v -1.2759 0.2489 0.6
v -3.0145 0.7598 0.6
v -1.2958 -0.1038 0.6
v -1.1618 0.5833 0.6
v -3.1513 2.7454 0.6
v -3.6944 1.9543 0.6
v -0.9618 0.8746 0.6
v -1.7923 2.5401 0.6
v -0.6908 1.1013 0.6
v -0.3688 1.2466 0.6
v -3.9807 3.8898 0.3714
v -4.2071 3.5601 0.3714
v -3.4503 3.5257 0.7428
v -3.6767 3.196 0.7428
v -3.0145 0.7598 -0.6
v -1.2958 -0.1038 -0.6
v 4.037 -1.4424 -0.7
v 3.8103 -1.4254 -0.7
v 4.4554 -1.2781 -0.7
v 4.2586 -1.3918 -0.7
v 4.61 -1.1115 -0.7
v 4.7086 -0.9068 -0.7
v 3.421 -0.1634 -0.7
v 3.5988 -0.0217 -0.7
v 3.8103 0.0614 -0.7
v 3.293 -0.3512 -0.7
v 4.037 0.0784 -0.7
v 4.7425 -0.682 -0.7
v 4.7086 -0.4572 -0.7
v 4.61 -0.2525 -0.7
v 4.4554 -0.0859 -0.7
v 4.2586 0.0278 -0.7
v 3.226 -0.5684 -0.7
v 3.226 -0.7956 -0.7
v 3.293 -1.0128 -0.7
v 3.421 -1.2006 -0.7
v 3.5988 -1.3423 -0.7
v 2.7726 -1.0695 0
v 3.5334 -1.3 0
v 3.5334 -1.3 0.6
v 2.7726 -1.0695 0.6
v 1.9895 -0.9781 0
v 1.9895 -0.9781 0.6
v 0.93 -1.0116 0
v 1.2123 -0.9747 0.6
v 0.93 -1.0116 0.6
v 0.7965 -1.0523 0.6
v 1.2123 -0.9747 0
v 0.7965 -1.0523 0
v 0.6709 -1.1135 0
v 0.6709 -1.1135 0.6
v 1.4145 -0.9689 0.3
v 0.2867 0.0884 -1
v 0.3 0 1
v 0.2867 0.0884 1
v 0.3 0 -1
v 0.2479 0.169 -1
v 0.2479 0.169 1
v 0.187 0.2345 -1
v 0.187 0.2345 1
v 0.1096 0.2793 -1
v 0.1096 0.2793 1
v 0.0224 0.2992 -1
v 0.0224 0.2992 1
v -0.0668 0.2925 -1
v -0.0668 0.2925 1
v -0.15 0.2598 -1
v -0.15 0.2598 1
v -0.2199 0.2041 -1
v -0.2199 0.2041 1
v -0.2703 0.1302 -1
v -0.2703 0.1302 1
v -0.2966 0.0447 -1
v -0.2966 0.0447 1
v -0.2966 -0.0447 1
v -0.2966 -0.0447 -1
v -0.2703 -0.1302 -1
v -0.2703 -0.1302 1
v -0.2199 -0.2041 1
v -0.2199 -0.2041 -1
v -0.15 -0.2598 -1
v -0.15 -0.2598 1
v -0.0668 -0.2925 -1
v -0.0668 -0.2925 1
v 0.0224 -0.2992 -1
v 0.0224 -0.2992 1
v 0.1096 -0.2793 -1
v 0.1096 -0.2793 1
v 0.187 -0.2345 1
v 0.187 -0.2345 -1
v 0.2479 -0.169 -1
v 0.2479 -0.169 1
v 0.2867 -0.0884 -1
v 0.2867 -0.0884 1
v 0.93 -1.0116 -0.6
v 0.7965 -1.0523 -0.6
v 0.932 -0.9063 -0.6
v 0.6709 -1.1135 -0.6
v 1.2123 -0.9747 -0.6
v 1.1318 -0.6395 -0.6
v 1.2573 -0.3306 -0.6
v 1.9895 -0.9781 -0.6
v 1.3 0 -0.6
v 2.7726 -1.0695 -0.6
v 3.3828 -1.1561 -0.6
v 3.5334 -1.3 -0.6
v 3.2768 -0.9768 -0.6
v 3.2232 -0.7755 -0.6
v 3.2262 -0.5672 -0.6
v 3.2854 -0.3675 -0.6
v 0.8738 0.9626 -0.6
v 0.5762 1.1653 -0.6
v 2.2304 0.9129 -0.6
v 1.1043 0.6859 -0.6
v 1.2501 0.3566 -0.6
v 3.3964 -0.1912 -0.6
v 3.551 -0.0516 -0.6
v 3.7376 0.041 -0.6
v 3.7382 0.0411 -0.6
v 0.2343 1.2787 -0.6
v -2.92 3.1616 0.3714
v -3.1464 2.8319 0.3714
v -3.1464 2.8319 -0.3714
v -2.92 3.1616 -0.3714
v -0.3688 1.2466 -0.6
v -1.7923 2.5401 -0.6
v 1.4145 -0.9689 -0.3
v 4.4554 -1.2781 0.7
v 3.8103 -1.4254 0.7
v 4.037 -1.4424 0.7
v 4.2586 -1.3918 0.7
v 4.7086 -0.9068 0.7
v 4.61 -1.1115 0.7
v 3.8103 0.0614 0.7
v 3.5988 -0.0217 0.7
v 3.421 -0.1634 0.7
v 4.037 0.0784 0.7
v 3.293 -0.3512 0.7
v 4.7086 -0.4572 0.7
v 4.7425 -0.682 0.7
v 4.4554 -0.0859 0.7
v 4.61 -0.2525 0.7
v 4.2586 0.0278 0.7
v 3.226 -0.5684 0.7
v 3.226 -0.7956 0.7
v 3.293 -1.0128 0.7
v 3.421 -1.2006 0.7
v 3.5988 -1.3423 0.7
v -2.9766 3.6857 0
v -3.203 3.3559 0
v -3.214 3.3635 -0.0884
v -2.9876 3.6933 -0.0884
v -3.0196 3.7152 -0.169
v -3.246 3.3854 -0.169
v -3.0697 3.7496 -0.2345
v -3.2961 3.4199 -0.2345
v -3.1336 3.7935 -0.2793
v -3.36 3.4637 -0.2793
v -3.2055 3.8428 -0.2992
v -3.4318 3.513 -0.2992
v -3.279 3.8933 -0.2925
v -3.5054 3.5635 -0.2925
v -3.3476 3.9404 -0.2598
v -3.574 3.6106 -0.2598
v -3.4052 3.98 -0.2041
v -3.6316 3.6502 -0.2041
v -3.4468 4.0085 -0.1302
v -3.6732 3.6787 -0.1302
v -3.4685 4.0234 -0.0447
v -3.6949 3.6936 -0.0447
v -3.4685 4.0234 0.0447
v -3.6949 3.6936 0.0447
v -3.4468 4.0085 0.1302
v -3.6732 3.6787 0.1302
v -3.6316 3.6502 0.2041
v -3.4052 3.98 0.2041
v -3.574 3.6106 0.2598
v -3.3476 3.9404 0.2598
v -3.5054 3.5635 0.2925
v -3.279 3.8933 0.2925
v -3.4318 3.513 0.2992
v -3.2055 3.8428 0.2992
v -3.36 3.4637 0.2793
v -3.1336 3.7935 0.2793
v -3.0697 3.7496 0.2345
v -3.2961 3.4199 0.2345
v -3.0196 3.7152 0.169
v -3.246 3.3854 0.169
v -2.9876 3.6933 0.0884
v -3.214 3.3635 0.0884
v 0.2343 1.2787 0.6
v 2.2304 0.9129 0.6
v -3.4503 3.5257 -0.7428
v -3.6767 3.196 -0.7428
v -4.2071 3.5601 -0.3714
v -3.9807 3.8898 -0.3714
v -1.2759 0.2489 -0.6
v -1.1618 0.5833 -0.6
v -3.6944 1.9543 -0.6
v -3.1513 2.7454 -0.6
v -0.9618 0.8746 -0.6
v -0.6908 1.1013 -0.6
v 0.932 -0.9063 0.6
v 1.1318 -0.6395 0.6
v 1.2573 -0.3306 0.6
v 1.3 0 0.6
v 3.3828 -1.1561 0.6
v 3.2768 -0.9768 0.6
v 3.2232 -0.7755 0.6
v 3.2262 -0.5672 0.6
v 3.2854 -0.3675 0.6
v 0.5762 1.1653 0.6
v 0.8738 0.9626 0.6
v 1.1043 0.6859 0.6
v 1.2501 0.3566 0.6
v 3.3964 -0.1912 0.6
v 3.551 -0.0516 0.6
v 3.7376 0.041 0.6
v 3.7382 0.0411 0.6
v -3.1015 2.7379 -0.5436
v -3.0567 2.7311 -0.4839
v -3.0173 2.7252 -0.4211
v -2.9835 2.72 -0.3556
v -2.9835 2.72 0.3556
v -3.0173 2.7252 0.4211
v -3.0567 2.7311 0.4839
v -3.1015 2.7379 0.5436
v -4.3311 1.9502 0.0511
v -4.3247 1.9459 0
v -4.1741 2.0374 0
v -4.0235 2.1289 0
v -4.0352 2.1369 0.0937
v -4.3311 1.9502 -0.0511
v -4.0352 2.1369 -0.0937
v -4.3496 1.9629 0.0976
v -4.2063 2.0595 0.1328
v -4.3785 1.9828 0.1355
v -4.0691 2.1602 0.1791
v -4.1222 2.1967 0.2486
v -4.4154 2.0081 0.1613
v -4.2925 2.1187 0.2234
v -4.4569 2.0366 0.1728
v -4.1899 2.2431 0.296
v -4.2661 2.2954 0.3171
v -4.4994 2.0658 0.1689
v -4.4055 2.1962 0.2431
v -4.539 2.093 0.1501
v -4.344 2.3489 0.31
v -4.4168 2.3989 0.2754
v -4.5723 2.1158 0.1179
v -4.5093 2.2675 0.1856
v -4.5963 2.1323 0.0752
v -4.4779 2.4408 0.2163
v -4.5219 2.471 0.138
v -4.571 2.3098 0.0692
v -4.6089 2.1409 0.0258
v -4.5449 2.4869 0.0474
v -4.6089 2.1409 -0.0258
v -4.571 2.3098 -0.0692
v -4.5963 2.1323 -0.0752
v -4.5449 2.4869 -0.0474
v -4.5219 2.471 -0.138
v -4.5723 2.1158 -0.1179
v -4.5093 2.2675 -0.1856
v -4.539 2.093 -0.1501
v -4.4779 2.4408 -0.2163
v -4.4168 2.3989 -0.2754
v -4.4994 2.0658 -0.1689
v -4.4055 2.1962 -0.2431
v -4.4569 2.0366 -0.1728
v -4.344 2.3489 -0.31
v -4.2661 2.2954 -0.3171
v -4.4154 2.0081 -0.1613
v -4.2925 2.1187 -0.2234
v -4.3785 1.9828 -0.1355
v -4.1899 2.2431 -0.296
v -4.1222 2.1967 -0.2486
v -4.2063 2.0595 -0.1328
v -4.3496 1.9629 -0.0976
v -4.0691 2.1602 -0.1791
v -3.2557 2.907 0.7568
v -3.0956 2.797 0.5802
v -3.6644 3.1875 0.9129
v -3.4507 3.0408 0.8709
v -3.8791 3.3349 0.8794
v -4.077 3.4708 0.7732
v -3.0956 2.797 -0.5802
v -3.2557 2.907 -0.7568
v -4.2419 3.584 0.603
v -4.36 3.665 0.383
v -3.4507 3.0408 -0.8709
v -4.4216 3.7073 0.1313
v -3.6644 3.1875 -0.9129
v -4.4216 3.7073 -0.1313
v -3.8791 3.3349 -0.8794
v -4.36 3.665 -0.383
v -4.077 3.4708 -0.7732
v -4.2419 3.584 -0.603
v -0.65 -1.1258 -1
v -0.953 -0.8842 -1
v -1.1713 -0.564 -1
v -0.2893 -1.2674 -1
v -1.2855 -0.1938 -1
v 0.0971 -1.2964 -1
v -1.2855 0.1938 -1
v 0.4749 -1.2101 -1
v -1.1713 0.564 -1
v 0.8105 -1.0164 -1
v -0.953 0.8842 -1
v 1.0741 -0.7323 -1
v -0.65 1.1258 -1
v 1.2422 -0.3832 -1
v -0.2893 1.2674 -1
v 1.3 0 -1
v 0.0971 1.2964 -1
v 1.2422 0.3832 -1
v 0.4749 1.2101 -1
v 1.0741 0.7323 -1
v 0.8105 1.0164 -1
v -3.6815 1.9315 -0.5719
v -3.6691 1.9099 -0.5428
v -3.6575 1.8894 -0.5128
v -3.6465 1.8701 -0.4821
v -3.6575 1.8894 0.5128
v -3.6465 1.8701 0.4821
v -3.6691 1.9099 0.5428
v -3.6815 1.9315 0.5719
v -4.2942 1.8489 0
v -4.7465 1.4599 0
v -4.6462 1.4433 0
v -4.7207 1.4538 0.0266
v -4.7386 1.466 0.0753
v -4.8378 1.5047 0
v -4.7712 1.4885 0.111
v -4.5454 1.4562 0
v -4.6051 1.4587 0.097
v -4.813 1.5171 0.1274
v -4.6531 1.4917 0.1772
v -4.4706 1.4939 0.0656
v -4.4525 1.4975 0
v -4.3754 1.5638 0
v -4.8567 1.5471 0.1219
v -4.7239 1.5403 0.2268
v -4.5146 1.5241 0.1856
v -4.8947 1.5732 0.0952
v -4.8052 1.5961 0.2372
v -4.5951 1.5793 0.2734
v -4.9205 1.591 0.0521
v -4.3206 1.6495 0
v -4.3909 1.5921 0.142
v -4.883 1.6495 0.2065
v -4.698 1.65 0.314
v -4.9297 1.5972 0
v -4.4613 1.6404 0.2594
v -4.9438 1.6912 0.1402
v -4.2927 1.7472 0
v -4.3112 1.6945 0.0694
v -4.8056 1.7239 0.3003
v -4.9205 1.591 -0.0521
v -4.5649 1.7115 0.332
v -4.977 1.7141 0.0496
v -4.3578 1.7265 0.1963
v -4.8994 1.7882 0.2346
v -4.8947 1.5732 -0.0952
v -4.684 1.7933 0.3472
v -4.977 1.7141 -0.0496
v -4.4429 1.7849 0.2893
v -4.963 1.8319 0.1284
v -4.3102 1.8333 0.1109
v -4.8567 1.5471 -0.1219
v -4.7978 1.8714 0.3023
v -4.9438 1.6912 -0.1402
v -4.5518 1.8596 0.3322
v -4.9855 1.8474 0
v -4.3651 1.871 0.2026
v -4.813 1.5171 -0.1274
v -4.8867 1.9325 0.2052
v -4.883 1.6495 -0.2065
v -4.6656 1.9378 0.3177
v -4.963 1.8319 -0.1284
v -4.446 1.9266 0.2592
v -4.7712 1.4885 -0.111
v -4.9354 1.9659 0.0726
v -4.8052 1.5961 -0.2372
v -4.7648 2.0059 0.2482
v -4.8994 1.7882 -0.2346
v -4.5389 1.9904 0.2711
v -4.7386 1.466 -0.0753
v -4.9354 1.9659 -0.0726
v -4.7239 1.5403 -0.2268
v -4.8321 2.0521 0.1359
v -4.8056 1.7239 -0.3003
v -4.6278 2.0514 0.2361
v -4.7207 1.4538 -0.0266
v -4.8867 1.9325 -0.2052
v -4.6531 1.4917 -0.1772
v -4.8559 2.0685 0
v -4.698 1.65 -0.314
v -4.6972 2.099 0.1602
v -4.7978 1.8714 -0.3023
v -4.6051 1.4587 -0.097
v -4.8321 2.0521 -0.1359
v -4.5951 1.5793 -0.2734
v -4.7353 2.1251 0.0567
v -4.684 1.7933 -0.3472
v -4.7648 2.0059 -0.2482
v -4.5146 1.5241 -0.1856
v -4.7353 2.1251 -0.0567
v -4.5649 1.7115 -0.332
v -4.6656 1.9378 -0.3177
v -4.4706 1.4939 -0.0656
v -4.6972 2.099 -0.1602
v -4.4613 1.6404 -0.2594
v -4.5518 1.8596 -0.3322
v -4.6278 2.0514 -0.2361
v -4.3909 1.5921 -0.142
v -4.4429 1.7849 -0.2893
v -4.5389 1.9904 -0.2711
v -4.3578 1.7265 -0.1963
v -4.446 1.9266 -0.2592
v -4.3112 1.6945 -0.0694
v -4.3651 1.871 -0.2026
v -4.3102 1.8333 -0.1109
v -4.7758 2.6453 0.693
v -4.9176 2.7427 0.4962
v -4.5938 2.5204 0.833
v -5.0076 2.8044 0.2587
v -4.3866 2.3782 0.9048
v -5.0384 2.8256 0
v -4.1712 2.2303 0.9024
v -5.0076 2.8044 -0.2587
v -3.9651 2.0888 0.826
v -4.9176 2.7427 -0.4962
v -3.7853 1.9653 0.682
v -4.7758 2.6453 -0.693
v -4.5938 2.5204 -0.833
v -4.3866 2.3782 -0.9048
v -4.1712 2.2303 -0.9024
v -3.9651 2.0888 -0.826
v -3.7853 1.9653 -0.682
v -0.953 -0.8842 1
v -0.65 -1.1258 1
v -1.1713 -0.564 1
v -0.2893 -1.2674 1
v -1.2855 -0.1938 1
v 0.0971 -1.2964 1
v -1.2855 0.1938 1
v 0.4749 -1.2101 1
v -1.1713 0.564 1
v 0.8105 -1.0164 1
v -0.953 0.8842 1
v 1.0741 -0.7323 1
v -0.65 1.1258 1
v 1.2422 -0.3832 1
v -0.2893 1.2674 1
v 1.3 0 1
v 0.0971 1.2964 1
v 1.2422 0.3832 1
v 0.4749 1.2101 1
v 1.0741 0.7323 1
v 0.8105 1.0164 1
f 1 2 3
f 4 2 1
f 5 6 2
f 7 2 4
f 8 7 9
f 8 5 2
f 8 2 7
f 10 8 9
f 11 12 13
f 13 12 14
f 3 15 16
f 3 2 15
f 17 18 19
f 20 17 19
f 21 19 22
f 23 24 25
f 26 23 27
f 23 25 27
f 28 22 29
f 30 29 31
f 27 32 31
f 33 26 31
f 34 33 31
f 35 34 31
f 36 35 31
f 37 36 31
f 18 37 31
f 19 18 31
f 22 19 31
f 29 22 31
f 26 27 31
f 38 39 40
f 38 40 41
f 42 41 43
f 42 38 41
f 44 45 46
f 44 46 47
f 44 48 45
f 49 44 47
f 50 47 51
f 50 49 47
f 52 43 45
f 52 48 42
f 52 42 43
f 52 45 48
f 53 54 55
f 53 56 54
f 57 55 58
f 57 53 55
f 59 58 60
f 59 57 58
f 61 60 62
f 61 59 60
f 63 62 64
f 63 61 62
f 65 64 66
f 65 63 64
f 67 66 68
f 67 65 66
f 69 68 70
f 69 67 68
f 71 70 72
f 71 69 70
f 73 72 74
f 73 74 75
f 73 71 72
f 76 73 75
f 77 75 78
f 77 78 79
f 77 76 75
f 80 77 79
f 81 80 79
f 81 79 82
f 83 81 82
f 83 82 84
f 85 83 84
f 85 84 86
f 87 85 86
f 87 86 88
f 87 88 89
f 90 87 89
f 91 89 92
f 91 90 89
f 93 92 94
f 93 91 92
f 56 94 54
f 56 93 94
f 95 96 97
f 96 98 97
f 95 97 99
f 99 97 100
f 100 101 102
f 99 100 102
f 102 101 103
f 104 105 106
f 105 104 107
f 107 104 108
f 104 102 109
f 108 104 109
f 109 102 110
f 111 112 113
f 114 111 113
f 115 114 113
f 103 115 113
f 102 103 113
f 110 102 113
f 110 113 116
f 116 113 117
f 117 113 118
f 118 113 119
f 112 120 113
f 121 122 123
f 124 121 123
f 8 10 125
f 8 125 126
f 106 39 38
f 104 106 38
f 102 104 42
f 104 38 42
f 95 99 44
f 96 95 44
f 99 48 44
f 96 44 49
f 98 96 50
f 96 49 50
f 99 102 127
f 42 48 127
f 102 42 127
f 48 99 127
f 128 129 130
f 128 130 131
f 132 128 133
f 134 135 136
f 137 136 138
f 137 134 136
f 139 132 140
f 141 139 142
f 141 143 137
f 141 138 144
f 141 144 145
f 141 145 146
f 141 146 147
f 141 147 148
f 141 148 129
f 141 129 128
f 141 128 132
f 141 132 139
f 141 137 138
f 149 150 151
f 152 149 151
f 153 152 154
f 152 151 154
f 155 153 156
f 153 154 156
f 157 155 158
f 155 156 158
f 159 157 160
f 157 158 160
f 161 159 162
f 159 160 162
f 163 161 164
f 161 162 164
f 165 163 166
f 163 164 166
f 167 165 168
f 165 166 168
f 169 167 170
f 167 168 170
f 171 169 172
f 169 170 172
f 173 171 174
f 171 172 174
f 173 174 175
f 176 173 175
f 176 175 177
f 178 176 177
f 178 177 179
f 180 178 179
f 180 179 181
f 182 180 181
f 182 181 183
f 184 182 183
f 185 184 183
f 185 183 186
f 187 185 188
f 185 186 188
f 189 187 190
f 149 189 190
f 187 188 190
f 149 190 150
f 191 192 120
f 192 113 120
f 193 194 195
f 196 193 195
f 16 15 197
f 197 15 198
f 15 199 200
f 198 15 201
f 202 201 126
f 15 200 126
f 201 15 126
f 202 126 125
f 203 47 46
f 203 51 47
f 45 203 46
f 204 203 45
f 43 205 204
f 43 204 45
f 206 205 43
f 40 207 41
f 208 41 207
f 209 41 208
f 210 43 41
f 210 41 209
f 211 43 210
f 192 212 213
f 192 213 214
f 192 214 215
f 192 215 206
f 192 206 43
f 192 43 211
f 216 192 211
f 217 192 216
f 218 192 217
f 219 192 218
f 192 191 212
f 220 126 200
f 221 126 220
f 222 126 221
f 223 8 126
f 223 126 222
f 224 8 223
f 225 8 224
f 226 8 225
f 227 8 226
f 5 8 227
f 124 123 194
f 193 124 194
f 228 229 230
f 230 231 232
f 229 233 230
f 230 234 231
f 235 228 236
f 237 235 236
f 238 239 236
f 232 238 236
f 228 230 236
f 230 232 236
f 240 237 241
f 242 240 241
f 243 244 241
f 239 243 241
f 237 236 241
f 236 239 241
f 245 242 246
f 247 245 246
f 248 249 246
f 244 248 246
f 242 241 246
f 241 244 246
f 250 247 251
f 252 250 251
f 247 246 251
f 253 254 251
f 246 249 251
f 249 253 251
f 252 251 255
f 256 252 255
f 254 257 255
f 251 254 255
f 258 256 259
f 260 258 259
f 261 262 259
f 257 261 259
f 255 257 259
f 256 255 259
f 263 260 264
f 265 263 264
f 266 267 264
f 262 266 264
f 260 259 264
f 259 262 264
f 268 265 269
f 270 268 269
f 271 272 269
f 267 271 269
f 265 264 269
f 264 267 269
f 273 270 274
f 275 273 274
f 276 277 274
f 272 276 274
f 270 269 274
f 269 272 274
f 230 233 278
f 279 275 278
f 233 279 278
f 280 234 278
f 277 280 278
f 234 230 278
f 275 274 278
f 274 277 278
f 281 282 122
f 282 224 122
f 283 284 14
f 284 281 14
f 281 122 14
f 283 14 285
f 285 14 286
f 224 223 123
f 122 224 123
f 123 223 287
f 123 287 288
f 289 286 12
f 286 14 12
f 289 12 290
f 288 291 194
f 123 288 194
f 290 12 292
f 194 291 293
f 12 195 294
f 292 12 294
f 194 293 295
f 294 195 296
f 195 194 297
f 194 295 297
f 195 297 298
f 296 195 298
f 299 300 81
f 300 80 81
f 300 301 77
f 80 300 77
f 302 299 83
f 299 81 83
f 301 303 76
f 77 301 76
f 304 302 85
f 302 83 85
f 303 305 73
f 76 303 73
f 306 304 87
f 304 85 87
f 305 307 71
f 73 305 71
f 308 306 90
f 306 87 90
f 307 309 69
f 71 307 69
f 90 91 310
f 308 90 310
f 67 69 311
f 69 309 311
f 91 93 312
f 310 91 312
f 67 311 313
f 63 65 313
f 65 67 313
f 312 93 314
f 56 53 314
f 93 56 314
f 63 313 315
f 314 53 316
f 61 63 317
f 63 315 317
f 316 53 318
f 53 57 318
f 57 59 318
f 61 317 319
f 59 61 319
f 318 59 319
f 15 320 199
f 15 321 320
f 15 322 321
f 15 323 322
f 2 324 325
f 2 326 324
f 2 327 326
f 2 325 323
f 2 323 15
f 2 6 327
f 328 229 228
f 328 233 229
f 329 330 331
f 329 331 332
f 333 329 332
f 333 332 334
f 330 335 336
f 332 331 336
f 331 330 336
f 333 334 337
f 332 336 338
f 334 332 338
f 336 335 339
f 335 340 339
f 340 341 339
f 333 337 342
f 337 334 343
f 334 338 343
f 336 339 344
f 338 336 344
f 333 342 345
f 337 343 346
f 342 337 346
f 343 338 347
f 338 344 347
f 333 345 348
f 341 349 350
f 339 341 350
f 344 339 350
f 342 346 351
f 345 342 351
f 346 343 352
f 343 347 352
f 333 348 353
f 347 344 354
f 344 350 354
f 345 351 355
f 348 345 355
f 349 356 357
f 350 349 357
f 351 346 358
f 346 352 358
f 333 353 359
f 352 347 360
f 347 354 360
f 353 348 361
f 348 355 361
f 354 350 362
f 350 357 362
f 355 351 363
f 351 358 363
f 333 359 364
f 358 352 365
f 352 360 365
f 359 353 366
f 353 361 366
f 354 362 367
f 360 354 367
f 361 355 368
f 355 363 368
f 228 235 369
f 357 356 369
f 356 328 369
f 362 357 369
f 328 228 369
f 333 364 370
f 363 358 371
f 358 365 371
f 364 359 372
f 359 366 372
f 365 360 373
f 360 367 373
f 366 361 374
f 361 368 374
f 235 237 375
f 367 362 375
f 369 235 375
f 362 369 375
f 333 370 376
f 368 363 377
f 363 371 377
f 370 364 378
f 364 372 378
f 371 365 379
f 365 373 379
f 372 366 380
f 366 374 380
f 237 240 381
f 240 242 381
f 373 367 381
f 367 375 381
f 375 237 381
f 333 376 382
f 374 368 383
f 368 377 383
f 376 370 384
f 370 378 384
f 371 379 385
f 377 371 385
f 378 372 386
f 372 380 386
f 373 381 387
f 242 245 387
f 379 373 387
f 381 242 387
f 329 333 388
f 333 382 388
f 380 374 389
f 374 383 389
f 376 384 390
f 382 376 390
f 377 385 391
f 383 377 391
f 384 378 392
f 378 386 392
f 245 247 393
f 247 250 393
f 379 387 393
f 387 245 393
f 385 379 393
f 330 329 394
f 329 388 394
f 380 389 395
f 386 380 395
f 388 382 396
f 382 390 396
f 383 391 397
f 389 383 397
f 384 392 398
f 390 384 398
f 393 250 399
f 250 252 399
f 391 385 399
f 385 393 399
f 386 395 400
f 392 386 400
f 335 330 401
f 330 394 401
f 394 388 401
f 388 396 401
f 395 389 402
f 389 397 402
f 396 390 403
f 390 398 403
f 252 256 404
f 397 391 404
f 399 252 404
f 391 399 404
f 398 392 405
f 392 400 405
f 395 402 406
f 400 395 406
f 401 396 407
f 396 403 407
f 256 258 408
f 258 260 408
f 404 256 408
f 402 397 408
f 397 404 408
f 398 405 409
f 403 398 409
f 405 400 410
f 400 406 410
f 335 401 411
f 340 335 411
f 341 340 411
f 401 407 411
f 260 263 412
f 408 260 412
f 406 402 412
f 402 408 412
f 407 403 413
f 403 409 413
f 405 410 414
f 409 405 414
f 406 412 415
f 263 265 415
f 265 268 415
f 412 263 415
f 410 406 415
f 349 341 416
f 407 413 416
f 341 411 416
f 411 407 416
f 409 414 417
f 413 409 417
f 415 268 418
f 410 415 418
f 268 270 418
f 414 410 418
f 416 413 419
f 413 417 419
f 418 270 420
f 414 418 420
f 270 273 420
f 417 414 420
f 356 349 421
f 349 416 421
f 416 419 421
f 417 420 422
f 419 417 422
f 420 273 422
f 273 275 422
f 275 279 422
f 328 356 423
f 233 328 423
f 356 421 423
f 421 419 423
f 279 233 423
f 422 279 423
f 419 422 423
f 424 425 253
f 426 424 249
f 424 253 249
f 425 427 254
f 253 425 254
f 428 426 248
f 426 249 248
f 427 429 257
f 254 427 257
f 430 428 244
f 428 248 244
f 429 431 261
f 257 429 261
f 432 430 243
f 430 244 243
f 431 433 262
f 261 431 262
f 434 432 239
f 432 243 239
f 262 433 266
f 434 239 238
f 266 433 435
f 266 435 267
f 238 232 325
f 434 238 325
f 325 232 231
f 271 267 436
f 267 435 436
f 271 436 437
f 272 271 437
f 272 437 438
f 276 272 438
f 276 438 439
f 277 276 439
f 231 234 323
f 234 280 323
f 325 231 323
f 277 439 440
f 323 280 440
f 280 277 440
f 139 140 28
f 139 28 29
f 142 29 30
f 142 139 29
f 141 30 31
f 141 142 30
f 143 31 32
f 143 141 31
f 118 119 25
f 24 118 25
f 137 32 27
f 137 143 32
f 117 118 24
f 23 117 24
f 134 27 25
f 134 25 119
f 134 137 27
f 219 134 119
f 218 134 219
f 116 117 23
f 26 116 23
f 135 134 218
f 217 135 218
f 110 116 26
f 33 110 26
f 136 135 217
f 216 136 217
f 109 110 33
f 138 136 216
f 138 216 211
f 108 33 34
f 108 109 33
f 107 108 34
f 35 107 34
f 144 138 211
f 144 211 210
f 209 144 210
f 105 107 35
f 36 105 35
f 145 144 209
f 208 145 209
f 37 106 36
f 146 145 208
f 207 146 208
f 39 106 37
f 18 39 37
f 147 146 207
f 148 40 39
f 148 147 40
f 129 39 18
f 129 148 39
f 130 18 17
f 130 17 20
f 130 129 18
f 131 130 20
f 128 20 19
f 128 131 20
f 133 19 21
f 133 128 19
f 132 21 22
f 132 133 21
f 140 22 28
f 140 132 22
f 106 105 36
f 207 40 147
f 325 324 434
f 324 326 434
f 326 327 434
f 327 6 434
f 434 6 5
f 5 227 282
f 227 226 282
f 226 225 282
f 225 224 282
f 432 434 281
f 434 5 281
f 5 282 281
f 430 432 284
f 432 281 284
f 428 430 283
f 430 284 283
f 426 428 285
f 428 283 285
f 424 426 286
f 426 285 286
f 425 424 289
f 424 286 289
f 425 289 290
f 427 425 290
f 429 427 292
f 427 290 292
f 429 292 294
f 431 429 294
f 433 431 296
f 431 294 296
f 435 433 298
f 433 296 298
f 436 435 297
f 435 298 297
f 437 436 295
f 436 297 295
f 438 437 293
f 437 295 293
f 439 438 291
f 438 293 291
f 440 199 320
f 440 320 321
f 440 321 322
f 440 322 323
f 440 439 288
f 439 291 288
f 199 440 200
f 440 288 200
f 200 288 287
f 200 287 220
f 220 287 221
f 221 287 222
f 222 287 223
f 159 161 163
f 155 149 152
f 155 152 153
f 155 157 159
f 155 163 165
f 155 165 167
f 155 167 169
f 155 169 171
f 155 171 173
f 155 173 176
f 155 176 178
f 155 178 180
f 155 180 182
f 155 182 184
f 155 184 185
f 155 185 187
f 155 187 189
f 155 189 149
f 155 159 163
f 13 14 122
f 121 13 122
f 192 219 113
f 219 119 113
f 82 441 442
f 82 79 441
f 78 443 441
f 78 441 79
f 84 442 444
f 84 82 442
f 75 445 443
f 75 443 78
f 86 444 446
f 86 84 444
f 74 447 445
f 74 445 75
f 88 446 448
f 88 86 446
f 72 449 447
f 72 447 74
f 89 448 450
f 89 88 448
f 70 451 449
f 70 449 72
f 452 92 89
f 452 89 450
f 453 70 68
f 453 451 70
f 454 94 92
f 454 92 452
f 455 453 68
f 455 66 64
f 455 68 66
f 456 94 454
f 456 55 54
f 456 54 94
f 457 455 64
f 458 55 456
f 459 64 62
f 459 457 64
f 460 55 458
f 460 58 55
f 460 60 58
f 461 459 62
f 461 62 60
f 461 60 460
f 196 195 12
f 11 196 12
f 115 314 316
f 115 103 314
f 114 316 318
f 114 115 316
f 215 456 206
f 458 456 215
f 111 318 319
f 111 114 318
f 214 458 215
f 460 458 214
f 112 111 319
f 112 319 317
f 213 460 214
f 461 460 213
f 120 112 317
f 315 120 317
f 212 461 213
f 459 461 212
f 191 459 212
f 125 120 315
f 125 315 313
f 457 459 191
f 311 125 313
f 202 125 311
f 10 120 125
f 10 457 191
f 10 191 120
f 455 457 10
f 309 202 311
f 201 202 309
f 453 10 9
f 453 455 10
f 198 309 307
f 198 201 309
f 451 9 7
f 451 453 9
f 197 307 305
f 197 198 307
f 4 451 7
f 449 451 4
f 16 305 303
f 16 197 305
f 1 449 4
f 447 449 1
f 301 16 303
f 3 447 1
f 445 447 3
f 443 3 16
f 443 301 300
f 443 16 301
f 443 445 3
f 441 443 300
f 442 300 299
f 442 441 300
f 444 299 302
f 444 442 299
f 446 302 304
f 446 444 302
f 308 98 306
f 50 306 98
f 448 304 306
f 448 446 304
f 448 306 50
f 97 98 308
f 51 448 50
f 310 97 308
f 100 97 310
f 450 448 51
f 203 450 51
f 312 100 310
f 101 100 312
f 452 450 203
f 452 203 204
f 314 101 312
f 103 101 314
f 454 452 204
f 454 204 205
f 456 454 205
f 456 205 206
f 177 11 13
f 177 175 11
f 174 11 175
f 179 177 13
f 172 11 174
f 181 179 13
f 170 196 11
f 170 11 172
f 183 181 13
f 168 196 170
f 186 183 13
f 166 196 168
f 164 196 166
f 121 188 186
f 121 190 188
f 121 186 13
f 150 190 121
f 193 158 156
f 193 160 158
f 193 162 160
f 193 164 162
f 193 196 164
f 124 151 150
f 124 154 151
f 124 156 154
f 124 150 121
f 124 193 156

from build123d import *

# Parameters (mm, degrees)
SKETCH1_R           = 0.3
BOSS_EXTRUDE1_DEPTH = 1
SKETCH1_3_R         = 0.7625000000000004
BOSS_EXTRUDE2_DEPTH = 0.7
BOSS_EXTRUDE3_DEPTH = 0.6
BOSS_EXTRUDE4_DEPTH = 0.6
BOSS_EXTRUDE6_DEPTH = 0.4
SKETCH6_R           = 0.3000000000000001
BOSS_EXTRUDE7_DEPTH = 0.4


with BuildPart() as part:
    # Sketch1 → Boss-Extrude1 (new, symmetric)
    with BuildSketch(Plane.XY):
        with BuildLine():
            ThreePointArc((-1.295848634155192, -0.1038090427569955), (-0.5937418022379002, -1.1564906710714489), (0.6708713102684308, -1.113522197829356))
            ThreePointArc((0.6708713102684308, -1.113522197829356), (1.1318420171006551, -0.639479200854508), (1.3, -3.2e-16))
            ThreePointArc((1.3, 0), (0.9986616226828521, 0.8322709675222685), (0.23434621018391855, 1.2787031922117167))
            ThreePointArc((0.23434621018391855, 1.2787031922117167), (-0.0691085103528238, 1.2981617825975365), (-0.3687821609940866, 1.2465952501644355))
            ThreePointArc((-0.3687821609940866, 1.2465952501644355), (-1.0717494388265327, 0.7357670421913532), (-1.295848634155192, -0.1038090427569955))
        make_face()
        Circle(SKETCH1_R, mode=Mode.SUBTRACT)
    extrude(amount=BOSS_EXTRUDE1_DEPTH, both=True)



with BuildPart() as body_2:
    # Sketch1<3> → Boss-Extrude2 (new, symmetric)
    with BuildSketch(Plane.XY):
        with Locations((3.98, -0.682)):
            Circle(SKETCH1_3_R)
    extrude(amount=BOSS_EXTRUDE2_DEPTH, both=True)


with BuildPart() as part_1:
    add(part.part)

    add(body_2.part)  # Boss-Extrude3 merges body 2
    # Sketch1<4> → Boss-Extrude3 (add, symmetric)
    with BuildSketch(Plane.XY):
        with BuildLine():
            ThreePointArc((3.533365641715731, -1.3), (3.2261959128288145, -0.5671712224047641), (3.737636771810271, 0.04095664850767766))
            Line((3.737636771810271, 0.04095664850767755), (3.7381940341609177, 0.04114322570610333))
            Line((3.7381940341609177, 0.04114322570610333), (2.2303973924281215, 0.9128895829698543))
            Line((2.2303973924281215, 0.9128895829698543), (0.23434621018391844, 1.2787031922117167))
            ThreePointArc((0.23434621018391855, 1.2787031922117167), (0.9986616226828521, 0.8322709675222685), (1.3, 0))
            ThreePointArc((1.3, -3.2e-16), (1.1318420171006551, -0.639479200854508), (0.6708713102684308, -1.113522197829356))
            add(Edge.make_bspline(
                [(3.5333656417157315, -1.2999999999999996), (2.853592038907404, -1.0130142701138514), (1.9102895764787398, -0.9421538050015439), (0.888636742859566, -0.9823235729807698), (0.6708713102684306, -1.1135221978293557)],
                knots=[0, 0, 0, 0, 0.7400506262012527, 1, 1, 1, 1], degree=3))
        make_face()
    extrude(amount=BOSS_EXTRUDE3_DEPTH, both=True)

    # Sketch1<6> → Boss-Extrude4 (add, symmetric)
    with BuildSketch(Plane.XY):
        with BuildLine():
            Line((-3.0144803813987955, 0.759770763252125), (-1.2958486341551916, -0.10380904275699543))
            ThreePointArc((-1.295848634155192, -0.1038090427569955), (-1.0717494388265327, 0.7357670421913532), (-0.3687821609940866, 1.2465952501644355))
            Line((-0.36878216099408667, 1.2465952501644357), (-1.7922612424124467, 2.5401069311108047))
            Line((-1.7922612424124467, 2.5401069311108047), (-3.4680051646498034, 2.7932311357927926))
            Line((-3.4680051646498034, 2.7932311357927926), (-3.852867925180665, 2.2326237370219917))
            Line((-3.852867925180665, 2.2326237370219917), (-3.0144803813987955, 0.7597707632521251))
        make_face()
    extrude(amount=BOSS_EXTRUDE4_DEPTH, both=True)



with BuildPart() as body_2_2:
    # Sketch2 → Revolve1 (revolve)
    with BuildSketch(Plane.XY):
        with BuildLine():
            Line((-3.8528679251806657, 2.2326237370219917), (-3.445366178736224, 2.82620804160284))
            Line((-3.445366178736224, 2.82620804160284), (-3.775135236836695, 3.052597900738641))
            Line((-3.775135236836695, 3.052597900738641), (-4.837794634960111, 1.5046832099548804))
            ThreePointArc((-4.837794634960111, 1.5046832099548804), (-4.411503380011568, 1.52785460803016), (-4.324738796734218, 1.9458654390179164))
            Line((-4.324738796734218, 1.9458654390179164), (-3.8528679251806657, 2.2326237370219917))
        make_face()
    revolve(axis=Axis((-3.775135236836695, 3.052597900738641, 0), (-0.5659746478395029, -0.8244226452511787, 0)))


with BuildPart() as part_2:
    add(part_1.part)

    add(body_2_2.part)  # Revolve2 merges body 2 2
    # Sketch3 → Revolve2 (revolve)
    with BuildSketch(Plane.XY):
        Polygon((-4.429411479514997, 3.7126978729057627), (-3.67671360440067, 3.195963019428297), (-4.285702325475976, 2.3088842531380287), (-5.038400200590302, 2.8256191066154948), align=None)
    revolve(axis=Axis((-3.67671360440067, 3.195963019428297, 0), (-0.5659746478395032, -0.8244226452511785, 0)))

    # Sketch4 → Boss-Extrude6 (add)
    with BuildSketch(Plane(origin=(0.313491998615034, 0.4566457238851012, 0), x_dir=(0.8244226452511784, -0.5659746478395034, 0), z_dir=(0.5659746478395032, 0.8244226452511783, 0))):
        Polygon((-5.4833075288067565, -0.3714137749282946), (-4.840000000000001, -0.7428275498565884), (-4.196692471193242, -0.3714137749282935), (-4.196692471193242, 0.37141377492829386), (-4.84, 0.7428275498565884), (-5.4833075288067565, 0.3714137749282939), align=None)
    extrude(amount=BOSS_EXTRUDE6_DEPTH)

    # Sketch6 → Boss-Extrude7 (add)
    with BuildSketch(Plane(origin=(0.5398818577508345, 0.7864147819855706, 0), x_dir=(0.824422645251178, -0.5659746478395038, 0), z_dir=(0.5659746478395038, 0.824422645251178, 0))):
        with Locations((-4.840000000000002, 0)):
            Circle(SKETCH6_R)
    extrude(amount=BOSS_EXTRUDE7_DEPTH)


solid = part_2.part
